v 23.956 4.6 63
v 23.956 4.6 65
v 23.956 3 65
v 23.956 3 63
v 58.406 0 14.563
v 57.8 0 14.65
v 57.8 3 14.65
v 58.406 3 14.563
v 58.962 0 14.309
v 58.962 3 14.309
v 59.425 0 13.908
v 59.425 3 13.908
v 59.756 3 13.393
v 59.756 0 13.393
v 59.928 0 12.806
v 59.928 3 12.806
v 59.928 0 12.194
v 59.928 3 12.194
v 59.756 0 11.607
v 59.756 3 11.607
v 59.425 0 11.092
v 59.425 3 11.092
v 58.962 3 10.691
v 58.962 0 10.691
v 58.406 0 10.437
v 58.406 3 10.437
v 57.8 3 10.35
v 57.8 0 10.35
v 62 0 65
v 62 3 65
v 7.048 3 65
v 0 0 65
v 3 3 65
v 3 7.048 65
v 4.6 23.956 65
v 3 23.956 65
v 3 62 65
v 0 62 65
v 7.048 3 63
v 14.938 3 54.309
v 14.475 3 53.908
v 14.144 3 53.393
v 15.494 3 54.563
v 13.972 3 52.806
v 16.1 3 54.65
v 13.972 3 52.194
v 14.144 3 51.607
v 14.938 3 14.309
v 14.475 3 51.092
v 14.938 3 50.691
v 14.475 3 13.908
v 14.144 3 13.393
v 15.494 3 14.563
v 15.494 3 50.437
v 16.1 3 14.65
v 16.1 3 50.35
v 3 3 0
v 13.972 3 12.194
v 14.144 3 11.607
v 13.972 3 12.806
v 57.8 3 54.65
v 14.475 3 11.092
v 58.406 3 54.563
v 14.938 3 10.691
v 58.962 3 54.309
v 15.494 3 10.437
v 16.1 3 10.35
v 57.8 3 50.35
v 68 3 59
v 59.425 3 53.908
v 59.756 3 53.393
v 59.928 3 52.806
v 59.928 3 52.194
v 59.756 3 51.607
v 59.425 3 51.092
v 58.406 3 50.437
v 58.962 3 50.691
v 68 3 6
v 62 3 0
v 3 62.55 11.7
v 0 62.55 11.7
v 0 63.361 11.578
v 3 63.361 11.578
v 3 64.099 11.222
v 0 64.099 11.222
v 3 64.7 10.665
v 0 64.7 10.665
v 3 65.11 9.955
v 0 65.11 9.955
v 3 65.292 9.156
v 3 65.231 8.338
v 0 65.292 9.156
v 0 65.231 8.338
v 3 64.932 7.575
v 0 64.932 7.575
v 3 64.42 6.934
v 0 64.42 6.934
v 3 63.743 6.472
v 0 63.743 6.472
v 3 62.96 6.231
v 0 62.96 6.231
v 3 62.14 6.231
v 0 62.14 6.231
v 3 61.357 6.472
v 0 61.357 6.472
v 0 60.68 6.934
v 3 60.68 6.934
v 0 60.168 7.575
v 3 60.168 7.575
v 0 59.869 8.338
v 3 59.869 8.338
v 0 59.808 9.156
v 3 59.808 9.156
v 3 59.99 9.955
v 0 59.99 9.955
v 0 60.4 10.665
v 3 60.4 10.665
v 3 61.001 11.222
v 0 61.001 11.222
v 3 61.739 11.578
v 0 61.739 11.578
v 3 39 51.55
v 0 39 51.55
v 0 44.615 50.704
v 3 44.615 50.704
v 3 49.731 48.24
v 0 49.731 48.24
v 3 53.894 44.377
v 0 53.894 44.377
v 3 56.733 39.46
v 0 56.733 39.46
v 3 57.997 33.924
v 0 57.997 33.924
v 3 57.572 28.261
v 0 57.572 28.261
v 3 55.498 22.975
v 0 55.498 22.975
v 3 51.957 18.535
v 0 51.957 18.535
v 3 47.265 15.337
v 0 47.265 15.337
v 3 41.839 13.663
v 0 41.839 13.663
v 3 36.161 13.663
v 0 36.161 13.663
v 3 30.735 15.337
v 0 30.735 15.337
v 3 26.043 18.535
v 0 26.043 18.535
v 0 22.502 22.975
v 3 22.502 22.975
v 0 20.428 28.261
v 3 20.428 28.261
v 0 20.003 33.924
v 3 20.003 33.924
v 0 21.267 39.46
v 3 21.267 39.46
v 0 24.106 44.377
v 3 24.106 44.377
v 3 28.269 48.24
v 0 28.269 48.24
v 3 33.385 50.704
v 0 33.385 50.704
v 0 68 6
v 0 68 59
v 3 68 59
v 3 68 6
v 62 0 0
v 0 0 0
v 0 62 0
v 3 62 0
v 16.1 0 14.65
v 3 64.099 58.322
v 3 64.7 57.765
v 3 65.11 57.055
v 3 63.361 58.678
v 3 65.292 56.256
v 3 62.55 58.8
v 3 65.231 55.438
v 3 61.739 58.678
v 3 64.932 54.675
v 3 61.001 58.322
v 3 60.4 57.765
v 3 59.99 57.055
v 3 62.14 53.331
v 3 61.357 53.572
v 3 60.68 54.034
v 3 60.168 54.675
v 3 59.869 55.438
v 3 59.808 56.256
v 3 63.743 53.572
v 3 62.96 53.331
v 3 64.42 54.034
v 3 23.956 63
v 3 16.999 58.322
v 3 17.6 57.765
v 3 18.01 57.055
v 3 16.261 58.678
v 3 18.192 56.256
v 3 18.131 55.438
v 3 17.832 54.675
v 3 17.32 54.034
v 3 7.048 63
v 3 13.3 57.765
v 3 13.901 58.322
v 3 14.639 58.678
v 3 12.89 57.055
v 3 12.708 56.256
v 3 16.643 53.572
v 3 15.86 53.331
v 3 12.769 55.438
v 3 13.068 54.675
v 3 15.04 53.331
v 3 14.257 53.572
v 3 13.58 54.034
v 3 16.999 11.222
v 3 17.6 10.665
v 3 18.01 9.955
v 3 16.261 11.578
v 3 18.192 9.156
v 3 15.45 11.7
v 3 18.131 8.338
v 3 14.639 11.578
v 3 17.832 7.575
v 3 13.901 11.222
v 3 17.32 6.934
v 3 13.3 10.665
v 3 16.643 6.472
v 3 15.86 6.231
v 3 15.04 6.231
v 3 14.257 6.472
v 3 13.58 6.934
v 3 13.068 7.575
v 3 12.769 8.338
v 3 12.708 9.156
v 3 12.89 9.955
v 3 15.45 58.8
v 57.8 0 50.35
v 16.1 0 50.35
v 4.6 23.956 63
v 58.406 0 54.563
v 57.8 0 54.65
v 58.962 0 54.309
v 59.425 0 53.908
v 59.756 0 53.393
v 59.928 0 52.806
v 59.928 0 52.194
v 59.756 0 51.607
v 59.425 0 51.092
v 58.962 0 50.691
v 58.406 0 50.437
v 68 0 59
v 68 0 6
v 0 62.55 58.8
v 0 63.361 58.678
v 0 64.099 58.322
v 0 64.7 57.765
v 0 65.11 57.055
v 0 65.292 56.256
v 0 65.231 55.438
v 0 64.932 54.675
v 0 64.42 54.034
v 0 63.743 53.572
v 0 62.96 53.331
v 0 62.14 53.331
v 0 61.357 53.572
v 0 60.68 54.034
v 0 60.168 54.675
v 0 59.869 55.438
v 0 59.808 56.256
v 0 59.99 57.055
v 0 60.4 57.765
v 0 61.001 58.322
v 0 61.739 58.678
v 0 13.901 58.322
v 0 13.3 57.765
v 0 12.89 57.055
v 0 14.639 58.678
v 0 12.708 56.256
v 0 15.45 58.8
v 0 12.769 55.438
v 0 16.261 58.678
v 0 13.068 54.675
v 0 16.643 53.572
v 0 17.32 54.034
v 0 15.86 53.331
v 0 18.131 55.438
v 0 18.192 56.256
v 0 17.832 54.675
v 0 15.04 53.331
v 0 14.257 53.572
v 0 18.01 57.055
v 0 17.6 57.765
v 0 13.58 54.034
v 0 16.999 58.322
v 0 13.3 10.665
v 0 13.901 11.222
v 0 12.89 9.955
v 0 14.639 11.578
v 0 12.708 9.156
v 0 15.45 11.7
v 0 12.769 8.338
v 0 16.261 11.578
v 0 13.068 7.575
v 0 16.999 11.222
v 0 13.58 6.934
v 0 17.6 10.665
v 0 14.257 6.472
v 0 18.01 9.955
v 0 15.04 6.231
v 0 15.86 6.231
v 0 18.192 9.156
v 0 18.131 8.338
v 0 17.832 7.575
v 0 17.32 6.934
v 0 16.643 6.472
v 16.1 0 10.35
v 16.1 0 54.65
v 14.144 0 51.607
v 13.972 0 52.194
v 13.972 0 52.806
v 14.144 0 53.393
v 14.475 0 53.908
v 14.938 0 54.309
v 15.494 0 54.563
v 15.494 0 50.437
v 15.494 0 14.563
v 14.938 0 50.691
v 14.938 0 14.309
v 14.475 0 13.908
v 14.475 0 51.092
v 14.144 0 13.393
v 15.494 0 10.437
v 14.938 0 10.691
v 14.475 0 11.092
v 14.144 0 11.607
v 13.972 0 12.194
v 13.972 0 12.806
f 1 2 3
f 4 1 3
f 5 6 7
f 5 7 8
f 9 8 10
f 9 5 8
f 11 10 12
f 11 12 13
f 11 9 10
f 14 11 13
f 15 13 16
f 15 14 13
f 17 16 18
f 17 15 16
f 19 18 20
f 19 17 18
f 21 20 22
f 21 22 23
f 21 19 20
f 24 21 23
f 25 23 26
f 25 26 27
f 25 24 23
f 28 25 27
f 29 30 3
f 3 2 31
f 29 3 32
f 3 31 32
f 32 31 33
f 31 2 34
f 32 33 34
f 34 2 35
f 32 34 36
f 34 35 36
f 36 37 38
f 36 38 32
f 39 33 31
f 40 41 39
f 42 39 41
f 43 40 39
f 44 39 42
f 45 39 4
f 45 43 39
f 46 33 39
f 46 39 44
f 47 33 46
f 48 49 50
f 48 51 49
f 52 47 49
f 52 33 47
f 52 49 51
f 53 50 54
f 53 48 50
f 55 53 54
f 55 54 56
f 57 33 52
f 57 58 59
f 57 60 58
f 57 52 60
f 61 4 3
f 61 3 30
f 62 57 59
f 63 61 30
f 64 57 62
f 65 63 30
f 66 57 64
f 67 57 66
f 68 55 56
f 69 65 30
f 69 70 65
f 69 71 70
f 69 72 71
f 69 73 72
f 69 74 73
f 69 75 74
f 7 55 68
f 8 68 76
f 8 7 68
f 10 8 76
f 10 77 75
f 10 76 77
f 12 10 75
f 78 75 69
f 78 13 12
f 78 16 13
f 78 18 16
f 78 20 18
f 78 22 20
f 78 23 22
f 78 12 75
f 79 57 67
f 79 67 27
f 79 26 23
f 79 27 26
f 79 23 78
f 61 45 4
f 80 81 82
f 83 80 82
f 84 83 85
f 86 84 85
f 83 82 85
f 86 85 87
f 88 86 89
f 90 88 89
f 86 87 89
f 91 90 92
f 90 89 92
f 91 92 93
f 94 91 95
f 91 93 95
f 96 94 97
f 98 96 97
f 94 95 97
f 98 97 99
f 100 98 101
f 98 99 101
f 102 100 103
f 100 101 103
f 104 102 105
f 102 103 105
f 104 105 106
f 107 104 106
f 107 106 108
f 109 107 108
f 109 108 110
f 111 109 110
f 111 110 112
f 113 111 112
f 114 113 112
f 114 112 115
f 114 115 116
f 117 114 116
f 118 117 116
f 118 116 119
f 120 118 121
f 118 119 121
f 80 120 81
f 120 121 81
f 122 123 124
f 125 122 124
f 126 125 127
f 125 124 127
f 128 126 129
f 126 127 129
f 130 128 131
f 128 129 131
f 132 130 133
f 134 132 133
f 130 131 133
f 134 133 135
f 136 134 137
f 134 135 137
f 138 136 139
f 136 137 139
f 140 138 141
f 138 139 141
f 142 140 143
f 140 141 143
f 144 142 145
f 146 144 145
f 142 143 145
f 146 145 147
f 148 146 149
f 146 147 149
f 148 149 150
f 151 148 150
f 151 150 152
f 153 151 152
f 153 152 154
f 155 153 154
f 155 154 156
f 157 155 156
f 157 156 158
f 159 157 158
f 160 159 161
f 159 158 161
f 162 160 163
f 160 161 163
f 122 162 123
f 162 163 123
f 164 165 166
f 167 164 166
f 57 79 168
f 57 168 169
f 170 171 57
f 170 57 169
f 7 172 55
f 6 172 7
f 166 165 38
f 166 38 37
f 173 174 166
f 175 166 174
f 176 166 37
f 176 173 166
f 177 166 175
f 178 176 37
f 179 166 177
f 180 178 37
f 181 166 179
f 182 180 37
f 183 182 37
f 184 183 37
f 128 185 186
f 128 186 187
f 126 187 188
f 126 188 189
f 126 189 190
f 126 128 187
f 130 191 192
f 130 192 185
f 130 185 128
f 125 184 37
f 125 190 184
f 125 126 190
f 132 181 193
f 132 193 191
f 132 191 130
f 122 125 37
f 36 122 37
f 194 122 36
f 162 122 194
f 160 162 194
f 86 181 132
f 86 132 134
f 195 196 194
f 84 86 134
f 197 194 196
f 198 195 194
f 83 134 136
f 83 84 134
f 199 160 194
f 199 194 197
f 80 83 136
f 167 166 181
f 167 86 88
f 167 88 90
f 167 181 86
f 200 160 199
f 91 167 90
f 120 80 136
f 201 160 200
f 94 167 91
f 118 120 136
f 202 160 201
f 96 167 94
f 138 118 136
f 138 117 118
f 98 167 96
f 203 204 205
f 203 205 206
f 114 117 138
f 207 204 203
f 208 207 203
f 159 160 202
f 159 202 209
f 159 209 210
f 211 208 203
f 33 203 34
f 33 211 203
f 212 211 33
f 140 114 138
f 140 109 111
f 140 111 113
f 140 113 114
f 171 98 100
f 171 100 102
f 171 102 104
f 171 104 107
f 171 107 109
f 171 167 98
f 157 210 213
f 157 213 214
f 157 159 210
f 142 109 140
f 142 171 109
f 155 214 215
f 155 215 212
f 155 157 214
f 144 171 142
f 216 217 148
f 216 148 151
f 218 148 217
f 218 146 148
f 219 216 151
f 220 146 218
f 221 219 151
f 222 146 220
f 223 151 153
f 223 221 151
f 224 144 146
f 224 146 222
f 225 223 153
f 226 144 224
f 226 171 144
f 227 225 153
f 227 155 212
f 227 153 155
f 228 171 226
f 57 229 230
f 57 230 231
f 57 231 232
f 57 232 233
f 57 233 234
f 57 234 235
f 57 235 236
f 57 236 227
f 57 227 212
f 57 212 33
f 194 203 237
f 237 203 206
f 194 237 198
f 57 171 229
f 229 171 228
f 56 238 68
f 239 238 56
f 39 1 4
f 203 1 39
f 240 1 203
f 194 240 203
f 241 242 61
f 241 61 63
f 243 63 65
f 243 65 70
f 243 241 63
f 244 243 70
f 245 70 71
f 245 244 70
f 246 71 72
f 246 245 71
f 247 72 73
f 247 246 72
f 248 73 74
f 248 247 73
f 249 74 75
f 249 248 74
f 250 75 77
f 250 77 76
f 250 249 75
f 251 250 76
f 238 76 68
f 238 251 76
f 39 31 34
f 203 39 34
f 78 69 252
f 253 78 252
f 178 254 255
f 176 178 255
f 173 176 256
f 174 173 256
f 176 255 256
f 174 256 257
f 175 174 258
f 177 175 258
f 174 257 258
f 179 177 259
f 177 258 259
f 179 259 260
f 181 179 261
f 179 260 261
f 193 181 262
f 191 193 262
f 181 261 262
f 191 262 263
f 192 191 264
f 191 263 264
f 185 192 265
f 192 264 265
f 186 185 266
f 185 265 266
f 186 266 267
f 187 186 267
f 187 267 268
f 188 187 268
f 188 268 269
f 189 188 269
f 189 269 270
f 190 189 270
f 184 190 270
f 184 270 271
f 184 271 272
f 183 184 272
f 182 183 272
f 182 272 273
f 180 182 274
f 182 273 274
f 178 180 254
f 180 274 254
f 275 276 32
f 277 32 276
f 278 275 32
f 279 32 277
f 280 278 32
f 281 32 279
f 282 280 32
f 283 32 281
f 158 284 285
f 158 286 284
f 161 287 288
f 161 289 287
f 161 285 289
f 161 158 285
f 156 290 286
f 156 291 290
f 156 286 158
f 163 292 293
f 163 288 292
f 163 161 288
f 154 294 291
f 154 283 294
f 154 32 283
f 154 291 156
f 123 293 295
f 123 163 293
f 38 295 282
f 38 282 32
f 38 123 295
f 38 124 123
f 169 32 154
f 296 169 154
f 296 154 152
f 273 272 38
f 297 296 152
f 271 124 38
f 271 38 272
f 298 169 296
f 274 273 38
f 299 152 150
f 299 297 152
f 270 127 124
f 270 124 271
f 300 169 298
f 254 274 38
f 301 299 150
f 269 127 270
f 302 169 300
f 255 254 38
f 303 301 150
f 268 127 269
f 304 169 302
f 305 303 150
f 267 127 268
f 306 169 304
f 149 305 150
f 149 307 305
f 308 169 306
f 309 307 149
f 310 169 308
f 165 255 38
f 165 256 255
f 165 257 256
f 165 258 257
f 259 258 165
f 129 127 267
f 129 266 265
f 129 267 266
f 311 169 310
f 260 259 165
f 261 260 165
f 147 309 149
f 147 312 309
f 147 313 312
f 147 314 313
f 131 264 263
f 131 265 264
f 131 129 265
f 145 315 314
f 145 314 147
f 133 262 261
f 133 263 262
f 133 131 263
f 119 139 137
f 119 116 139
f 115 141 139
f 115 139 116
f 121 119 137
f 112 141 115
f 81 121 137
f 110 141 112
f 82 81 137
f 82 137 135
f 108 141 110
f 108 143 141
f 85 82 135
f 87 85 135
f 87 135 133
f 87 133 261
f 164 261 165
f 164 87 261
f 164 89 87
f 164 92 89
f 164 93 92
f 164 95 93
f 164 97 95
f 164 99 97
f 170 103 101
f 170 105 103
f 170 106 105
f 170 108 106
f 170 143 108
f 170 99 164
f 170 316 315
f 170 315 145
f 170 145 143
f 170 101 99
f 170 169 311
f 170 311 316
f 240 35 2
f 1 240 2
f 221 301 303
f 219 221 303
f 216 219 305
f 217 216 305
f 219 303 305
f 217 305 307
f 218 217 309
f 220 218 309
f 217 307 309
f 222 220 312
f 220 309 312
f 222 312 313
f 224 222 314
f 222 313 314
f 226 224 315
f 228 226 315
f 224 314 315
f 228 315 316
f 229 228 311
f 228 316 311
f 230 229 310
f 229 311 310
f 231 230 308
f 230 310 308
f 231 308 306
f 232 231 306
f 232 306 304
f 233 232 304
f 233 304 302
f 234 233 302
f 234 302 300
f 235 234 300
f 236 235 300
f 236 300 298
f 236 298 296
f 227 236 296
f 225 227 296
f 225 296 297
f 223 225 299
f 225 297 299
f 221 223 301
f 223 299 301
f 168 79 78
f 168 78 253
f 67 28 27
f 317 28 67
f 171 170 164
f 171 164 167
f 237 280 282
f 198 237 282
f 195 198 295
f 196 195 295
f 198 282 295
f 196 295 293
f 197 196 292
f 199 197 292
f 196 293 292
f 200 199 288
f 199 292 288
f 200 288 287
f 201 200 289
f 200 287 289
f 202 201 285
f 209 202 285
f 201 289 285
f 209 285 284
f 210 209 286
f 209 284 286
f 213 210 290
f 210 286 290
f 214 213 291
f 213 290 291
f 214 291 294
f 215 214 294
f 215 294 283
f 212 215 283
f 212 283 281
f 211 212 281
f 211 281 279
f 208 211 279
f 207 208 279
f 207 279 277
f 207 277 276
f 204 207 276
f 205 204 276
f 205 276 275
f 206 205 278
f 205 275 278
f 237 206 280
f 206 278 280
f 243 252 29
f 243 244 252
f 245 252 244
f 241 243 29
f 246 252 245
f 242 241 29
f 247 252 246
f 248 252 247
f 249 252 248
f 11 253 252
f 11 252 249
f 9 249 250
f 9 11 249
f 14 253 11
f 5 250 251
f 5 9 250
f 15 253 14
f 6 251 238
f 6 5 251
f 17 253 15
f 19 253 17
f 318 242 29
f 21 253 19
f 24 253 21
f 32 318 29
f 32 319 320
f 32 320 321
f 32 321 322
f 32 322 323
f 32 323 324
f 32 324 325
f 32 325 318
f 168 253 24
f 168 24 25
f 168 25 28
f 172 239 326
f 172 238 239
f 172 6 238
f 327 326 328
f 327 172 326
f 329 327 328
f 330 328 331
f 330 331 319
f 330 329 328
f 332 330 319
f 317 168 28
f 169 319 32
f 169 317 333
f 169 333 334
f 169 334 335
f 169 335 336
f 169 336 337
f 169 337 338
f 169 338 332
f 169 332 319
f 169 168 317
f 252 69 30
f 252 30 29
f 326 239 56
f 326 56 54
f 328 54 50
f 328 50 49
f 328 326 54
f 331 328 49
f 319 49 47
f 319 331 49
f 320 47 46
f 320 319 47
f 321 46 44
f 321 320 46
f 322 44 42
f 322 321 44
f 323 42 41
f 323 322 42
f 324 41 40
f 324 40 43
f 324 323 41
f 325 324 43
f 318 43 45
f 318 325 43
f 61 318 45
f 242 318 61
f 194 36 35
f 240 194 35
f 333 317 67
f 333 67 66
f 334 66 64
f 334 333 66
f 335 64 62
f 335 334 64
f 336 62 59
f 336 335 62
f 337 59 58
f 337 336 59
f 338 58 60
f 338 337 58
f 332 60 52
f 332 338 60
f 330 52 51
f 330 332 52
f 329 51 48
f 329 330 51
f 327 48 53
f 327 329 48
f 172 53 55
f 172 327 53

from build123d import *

# Parameters (mm, degrees)
BOSS_EXTRUDE1_DEPTH = 65
CHAMFER1_SIZE       = 6
BOSS_EXTRUDE2_DEPTH = 2
SKETCH3_R           = 19.05
SKETCH3_R_2         = 2.75
CUT_EXTRUDE1_DEPTH  = 3
CUT_EXTRUDE2_DEPTH  = 3


with BuildPart() as part:
    # Sketch1 → Boss-Extrude1 (new body)
    with BuildSketch(Plane.XY):
        Polygon((0, 0), (0, 68), (3, 68), (3, 3), (68, 3), (68, 0), align=None)
    extrude(amount=BOSS_EXTRUDE1_DEPTH)

    # Chamfer1
    chamfer1_edges = [part.edges().sort_by_distance(p)[0] for p in [
        (1.5, 68, 65),
        (1.5, 68, 0),
        (68, 1.5, 65),
        (68, 1.5, 0),
    ]]
    chamfer(chamfer1_edges, length=CHAMFER1_SIZE)

    # Sketch2 → Boss-Extrude2 (add)
    with BuildSketch(Plane.XY.offset(65)):
        Polygon((4.600185007, 23.955878092), (23.955878092, 4.600185007), (23.955878092, 3), (7.047822016, 3), (3, 7.047822016), (3, 23.955878092), align=None)
    extrude(amount=-BOSS_EXTRUDE2_DEPTH)

    # Sketch3 → Cut-Extrude1 (cut)
    with BuildSketch(Plane.ZY):
        with Locations((32.5, 39)):
            Circle(SKETCH3_R)
        with Locations((8.95, 62.55)):
            Circle(SKETCH3_R_2)
        with Locations((56.05, 62.55)):
            Circle(SKETCH3_R_2)
        with Locations((8.95, 15.45)):
            Circle(SKETCH3_R_2)
        with Locations((56.05, 15.45)):
            Circle(SKETCH3_R_2)
    extrude(amount=-CUT_EXTRUDE1_DEPTH, mode=Mode.SUBTRACT)

    # Sketch4 → Cut-Extrude2 (cut)
    with BuildSketch(Plane.XZ):
        with BuildLine():
            Line((16.1, 54.65), (57.8, 54.65))
            ThreePointArc((57.8, 54.65), (59.95, 52.5), (57.8, 50.35))
            Line((57.8, 50.35), (16.1, 50.35))
            ThreePointArc((16.1, 50.35), (13.95, 52.5), (16.1, 54.65))
        make_face()
        with BuildLine():
            Line((16.1, 14.65), (57.8, 14.65))
            ThreePointArc((57.8, 14.65), (59.95, 12.5), (57.8, 10.35))
            Line((57.8, 10.35), (16.1, 10.35))
            ThreePointArc((16.1, 10.35), (13.95, 12.5), (16.1, 14.65))
        make_face()
    extrude(amount=-CUT_EXTRUDE2_DEPTH, mode=Mode.SUBTRACT)


solid = part.part
